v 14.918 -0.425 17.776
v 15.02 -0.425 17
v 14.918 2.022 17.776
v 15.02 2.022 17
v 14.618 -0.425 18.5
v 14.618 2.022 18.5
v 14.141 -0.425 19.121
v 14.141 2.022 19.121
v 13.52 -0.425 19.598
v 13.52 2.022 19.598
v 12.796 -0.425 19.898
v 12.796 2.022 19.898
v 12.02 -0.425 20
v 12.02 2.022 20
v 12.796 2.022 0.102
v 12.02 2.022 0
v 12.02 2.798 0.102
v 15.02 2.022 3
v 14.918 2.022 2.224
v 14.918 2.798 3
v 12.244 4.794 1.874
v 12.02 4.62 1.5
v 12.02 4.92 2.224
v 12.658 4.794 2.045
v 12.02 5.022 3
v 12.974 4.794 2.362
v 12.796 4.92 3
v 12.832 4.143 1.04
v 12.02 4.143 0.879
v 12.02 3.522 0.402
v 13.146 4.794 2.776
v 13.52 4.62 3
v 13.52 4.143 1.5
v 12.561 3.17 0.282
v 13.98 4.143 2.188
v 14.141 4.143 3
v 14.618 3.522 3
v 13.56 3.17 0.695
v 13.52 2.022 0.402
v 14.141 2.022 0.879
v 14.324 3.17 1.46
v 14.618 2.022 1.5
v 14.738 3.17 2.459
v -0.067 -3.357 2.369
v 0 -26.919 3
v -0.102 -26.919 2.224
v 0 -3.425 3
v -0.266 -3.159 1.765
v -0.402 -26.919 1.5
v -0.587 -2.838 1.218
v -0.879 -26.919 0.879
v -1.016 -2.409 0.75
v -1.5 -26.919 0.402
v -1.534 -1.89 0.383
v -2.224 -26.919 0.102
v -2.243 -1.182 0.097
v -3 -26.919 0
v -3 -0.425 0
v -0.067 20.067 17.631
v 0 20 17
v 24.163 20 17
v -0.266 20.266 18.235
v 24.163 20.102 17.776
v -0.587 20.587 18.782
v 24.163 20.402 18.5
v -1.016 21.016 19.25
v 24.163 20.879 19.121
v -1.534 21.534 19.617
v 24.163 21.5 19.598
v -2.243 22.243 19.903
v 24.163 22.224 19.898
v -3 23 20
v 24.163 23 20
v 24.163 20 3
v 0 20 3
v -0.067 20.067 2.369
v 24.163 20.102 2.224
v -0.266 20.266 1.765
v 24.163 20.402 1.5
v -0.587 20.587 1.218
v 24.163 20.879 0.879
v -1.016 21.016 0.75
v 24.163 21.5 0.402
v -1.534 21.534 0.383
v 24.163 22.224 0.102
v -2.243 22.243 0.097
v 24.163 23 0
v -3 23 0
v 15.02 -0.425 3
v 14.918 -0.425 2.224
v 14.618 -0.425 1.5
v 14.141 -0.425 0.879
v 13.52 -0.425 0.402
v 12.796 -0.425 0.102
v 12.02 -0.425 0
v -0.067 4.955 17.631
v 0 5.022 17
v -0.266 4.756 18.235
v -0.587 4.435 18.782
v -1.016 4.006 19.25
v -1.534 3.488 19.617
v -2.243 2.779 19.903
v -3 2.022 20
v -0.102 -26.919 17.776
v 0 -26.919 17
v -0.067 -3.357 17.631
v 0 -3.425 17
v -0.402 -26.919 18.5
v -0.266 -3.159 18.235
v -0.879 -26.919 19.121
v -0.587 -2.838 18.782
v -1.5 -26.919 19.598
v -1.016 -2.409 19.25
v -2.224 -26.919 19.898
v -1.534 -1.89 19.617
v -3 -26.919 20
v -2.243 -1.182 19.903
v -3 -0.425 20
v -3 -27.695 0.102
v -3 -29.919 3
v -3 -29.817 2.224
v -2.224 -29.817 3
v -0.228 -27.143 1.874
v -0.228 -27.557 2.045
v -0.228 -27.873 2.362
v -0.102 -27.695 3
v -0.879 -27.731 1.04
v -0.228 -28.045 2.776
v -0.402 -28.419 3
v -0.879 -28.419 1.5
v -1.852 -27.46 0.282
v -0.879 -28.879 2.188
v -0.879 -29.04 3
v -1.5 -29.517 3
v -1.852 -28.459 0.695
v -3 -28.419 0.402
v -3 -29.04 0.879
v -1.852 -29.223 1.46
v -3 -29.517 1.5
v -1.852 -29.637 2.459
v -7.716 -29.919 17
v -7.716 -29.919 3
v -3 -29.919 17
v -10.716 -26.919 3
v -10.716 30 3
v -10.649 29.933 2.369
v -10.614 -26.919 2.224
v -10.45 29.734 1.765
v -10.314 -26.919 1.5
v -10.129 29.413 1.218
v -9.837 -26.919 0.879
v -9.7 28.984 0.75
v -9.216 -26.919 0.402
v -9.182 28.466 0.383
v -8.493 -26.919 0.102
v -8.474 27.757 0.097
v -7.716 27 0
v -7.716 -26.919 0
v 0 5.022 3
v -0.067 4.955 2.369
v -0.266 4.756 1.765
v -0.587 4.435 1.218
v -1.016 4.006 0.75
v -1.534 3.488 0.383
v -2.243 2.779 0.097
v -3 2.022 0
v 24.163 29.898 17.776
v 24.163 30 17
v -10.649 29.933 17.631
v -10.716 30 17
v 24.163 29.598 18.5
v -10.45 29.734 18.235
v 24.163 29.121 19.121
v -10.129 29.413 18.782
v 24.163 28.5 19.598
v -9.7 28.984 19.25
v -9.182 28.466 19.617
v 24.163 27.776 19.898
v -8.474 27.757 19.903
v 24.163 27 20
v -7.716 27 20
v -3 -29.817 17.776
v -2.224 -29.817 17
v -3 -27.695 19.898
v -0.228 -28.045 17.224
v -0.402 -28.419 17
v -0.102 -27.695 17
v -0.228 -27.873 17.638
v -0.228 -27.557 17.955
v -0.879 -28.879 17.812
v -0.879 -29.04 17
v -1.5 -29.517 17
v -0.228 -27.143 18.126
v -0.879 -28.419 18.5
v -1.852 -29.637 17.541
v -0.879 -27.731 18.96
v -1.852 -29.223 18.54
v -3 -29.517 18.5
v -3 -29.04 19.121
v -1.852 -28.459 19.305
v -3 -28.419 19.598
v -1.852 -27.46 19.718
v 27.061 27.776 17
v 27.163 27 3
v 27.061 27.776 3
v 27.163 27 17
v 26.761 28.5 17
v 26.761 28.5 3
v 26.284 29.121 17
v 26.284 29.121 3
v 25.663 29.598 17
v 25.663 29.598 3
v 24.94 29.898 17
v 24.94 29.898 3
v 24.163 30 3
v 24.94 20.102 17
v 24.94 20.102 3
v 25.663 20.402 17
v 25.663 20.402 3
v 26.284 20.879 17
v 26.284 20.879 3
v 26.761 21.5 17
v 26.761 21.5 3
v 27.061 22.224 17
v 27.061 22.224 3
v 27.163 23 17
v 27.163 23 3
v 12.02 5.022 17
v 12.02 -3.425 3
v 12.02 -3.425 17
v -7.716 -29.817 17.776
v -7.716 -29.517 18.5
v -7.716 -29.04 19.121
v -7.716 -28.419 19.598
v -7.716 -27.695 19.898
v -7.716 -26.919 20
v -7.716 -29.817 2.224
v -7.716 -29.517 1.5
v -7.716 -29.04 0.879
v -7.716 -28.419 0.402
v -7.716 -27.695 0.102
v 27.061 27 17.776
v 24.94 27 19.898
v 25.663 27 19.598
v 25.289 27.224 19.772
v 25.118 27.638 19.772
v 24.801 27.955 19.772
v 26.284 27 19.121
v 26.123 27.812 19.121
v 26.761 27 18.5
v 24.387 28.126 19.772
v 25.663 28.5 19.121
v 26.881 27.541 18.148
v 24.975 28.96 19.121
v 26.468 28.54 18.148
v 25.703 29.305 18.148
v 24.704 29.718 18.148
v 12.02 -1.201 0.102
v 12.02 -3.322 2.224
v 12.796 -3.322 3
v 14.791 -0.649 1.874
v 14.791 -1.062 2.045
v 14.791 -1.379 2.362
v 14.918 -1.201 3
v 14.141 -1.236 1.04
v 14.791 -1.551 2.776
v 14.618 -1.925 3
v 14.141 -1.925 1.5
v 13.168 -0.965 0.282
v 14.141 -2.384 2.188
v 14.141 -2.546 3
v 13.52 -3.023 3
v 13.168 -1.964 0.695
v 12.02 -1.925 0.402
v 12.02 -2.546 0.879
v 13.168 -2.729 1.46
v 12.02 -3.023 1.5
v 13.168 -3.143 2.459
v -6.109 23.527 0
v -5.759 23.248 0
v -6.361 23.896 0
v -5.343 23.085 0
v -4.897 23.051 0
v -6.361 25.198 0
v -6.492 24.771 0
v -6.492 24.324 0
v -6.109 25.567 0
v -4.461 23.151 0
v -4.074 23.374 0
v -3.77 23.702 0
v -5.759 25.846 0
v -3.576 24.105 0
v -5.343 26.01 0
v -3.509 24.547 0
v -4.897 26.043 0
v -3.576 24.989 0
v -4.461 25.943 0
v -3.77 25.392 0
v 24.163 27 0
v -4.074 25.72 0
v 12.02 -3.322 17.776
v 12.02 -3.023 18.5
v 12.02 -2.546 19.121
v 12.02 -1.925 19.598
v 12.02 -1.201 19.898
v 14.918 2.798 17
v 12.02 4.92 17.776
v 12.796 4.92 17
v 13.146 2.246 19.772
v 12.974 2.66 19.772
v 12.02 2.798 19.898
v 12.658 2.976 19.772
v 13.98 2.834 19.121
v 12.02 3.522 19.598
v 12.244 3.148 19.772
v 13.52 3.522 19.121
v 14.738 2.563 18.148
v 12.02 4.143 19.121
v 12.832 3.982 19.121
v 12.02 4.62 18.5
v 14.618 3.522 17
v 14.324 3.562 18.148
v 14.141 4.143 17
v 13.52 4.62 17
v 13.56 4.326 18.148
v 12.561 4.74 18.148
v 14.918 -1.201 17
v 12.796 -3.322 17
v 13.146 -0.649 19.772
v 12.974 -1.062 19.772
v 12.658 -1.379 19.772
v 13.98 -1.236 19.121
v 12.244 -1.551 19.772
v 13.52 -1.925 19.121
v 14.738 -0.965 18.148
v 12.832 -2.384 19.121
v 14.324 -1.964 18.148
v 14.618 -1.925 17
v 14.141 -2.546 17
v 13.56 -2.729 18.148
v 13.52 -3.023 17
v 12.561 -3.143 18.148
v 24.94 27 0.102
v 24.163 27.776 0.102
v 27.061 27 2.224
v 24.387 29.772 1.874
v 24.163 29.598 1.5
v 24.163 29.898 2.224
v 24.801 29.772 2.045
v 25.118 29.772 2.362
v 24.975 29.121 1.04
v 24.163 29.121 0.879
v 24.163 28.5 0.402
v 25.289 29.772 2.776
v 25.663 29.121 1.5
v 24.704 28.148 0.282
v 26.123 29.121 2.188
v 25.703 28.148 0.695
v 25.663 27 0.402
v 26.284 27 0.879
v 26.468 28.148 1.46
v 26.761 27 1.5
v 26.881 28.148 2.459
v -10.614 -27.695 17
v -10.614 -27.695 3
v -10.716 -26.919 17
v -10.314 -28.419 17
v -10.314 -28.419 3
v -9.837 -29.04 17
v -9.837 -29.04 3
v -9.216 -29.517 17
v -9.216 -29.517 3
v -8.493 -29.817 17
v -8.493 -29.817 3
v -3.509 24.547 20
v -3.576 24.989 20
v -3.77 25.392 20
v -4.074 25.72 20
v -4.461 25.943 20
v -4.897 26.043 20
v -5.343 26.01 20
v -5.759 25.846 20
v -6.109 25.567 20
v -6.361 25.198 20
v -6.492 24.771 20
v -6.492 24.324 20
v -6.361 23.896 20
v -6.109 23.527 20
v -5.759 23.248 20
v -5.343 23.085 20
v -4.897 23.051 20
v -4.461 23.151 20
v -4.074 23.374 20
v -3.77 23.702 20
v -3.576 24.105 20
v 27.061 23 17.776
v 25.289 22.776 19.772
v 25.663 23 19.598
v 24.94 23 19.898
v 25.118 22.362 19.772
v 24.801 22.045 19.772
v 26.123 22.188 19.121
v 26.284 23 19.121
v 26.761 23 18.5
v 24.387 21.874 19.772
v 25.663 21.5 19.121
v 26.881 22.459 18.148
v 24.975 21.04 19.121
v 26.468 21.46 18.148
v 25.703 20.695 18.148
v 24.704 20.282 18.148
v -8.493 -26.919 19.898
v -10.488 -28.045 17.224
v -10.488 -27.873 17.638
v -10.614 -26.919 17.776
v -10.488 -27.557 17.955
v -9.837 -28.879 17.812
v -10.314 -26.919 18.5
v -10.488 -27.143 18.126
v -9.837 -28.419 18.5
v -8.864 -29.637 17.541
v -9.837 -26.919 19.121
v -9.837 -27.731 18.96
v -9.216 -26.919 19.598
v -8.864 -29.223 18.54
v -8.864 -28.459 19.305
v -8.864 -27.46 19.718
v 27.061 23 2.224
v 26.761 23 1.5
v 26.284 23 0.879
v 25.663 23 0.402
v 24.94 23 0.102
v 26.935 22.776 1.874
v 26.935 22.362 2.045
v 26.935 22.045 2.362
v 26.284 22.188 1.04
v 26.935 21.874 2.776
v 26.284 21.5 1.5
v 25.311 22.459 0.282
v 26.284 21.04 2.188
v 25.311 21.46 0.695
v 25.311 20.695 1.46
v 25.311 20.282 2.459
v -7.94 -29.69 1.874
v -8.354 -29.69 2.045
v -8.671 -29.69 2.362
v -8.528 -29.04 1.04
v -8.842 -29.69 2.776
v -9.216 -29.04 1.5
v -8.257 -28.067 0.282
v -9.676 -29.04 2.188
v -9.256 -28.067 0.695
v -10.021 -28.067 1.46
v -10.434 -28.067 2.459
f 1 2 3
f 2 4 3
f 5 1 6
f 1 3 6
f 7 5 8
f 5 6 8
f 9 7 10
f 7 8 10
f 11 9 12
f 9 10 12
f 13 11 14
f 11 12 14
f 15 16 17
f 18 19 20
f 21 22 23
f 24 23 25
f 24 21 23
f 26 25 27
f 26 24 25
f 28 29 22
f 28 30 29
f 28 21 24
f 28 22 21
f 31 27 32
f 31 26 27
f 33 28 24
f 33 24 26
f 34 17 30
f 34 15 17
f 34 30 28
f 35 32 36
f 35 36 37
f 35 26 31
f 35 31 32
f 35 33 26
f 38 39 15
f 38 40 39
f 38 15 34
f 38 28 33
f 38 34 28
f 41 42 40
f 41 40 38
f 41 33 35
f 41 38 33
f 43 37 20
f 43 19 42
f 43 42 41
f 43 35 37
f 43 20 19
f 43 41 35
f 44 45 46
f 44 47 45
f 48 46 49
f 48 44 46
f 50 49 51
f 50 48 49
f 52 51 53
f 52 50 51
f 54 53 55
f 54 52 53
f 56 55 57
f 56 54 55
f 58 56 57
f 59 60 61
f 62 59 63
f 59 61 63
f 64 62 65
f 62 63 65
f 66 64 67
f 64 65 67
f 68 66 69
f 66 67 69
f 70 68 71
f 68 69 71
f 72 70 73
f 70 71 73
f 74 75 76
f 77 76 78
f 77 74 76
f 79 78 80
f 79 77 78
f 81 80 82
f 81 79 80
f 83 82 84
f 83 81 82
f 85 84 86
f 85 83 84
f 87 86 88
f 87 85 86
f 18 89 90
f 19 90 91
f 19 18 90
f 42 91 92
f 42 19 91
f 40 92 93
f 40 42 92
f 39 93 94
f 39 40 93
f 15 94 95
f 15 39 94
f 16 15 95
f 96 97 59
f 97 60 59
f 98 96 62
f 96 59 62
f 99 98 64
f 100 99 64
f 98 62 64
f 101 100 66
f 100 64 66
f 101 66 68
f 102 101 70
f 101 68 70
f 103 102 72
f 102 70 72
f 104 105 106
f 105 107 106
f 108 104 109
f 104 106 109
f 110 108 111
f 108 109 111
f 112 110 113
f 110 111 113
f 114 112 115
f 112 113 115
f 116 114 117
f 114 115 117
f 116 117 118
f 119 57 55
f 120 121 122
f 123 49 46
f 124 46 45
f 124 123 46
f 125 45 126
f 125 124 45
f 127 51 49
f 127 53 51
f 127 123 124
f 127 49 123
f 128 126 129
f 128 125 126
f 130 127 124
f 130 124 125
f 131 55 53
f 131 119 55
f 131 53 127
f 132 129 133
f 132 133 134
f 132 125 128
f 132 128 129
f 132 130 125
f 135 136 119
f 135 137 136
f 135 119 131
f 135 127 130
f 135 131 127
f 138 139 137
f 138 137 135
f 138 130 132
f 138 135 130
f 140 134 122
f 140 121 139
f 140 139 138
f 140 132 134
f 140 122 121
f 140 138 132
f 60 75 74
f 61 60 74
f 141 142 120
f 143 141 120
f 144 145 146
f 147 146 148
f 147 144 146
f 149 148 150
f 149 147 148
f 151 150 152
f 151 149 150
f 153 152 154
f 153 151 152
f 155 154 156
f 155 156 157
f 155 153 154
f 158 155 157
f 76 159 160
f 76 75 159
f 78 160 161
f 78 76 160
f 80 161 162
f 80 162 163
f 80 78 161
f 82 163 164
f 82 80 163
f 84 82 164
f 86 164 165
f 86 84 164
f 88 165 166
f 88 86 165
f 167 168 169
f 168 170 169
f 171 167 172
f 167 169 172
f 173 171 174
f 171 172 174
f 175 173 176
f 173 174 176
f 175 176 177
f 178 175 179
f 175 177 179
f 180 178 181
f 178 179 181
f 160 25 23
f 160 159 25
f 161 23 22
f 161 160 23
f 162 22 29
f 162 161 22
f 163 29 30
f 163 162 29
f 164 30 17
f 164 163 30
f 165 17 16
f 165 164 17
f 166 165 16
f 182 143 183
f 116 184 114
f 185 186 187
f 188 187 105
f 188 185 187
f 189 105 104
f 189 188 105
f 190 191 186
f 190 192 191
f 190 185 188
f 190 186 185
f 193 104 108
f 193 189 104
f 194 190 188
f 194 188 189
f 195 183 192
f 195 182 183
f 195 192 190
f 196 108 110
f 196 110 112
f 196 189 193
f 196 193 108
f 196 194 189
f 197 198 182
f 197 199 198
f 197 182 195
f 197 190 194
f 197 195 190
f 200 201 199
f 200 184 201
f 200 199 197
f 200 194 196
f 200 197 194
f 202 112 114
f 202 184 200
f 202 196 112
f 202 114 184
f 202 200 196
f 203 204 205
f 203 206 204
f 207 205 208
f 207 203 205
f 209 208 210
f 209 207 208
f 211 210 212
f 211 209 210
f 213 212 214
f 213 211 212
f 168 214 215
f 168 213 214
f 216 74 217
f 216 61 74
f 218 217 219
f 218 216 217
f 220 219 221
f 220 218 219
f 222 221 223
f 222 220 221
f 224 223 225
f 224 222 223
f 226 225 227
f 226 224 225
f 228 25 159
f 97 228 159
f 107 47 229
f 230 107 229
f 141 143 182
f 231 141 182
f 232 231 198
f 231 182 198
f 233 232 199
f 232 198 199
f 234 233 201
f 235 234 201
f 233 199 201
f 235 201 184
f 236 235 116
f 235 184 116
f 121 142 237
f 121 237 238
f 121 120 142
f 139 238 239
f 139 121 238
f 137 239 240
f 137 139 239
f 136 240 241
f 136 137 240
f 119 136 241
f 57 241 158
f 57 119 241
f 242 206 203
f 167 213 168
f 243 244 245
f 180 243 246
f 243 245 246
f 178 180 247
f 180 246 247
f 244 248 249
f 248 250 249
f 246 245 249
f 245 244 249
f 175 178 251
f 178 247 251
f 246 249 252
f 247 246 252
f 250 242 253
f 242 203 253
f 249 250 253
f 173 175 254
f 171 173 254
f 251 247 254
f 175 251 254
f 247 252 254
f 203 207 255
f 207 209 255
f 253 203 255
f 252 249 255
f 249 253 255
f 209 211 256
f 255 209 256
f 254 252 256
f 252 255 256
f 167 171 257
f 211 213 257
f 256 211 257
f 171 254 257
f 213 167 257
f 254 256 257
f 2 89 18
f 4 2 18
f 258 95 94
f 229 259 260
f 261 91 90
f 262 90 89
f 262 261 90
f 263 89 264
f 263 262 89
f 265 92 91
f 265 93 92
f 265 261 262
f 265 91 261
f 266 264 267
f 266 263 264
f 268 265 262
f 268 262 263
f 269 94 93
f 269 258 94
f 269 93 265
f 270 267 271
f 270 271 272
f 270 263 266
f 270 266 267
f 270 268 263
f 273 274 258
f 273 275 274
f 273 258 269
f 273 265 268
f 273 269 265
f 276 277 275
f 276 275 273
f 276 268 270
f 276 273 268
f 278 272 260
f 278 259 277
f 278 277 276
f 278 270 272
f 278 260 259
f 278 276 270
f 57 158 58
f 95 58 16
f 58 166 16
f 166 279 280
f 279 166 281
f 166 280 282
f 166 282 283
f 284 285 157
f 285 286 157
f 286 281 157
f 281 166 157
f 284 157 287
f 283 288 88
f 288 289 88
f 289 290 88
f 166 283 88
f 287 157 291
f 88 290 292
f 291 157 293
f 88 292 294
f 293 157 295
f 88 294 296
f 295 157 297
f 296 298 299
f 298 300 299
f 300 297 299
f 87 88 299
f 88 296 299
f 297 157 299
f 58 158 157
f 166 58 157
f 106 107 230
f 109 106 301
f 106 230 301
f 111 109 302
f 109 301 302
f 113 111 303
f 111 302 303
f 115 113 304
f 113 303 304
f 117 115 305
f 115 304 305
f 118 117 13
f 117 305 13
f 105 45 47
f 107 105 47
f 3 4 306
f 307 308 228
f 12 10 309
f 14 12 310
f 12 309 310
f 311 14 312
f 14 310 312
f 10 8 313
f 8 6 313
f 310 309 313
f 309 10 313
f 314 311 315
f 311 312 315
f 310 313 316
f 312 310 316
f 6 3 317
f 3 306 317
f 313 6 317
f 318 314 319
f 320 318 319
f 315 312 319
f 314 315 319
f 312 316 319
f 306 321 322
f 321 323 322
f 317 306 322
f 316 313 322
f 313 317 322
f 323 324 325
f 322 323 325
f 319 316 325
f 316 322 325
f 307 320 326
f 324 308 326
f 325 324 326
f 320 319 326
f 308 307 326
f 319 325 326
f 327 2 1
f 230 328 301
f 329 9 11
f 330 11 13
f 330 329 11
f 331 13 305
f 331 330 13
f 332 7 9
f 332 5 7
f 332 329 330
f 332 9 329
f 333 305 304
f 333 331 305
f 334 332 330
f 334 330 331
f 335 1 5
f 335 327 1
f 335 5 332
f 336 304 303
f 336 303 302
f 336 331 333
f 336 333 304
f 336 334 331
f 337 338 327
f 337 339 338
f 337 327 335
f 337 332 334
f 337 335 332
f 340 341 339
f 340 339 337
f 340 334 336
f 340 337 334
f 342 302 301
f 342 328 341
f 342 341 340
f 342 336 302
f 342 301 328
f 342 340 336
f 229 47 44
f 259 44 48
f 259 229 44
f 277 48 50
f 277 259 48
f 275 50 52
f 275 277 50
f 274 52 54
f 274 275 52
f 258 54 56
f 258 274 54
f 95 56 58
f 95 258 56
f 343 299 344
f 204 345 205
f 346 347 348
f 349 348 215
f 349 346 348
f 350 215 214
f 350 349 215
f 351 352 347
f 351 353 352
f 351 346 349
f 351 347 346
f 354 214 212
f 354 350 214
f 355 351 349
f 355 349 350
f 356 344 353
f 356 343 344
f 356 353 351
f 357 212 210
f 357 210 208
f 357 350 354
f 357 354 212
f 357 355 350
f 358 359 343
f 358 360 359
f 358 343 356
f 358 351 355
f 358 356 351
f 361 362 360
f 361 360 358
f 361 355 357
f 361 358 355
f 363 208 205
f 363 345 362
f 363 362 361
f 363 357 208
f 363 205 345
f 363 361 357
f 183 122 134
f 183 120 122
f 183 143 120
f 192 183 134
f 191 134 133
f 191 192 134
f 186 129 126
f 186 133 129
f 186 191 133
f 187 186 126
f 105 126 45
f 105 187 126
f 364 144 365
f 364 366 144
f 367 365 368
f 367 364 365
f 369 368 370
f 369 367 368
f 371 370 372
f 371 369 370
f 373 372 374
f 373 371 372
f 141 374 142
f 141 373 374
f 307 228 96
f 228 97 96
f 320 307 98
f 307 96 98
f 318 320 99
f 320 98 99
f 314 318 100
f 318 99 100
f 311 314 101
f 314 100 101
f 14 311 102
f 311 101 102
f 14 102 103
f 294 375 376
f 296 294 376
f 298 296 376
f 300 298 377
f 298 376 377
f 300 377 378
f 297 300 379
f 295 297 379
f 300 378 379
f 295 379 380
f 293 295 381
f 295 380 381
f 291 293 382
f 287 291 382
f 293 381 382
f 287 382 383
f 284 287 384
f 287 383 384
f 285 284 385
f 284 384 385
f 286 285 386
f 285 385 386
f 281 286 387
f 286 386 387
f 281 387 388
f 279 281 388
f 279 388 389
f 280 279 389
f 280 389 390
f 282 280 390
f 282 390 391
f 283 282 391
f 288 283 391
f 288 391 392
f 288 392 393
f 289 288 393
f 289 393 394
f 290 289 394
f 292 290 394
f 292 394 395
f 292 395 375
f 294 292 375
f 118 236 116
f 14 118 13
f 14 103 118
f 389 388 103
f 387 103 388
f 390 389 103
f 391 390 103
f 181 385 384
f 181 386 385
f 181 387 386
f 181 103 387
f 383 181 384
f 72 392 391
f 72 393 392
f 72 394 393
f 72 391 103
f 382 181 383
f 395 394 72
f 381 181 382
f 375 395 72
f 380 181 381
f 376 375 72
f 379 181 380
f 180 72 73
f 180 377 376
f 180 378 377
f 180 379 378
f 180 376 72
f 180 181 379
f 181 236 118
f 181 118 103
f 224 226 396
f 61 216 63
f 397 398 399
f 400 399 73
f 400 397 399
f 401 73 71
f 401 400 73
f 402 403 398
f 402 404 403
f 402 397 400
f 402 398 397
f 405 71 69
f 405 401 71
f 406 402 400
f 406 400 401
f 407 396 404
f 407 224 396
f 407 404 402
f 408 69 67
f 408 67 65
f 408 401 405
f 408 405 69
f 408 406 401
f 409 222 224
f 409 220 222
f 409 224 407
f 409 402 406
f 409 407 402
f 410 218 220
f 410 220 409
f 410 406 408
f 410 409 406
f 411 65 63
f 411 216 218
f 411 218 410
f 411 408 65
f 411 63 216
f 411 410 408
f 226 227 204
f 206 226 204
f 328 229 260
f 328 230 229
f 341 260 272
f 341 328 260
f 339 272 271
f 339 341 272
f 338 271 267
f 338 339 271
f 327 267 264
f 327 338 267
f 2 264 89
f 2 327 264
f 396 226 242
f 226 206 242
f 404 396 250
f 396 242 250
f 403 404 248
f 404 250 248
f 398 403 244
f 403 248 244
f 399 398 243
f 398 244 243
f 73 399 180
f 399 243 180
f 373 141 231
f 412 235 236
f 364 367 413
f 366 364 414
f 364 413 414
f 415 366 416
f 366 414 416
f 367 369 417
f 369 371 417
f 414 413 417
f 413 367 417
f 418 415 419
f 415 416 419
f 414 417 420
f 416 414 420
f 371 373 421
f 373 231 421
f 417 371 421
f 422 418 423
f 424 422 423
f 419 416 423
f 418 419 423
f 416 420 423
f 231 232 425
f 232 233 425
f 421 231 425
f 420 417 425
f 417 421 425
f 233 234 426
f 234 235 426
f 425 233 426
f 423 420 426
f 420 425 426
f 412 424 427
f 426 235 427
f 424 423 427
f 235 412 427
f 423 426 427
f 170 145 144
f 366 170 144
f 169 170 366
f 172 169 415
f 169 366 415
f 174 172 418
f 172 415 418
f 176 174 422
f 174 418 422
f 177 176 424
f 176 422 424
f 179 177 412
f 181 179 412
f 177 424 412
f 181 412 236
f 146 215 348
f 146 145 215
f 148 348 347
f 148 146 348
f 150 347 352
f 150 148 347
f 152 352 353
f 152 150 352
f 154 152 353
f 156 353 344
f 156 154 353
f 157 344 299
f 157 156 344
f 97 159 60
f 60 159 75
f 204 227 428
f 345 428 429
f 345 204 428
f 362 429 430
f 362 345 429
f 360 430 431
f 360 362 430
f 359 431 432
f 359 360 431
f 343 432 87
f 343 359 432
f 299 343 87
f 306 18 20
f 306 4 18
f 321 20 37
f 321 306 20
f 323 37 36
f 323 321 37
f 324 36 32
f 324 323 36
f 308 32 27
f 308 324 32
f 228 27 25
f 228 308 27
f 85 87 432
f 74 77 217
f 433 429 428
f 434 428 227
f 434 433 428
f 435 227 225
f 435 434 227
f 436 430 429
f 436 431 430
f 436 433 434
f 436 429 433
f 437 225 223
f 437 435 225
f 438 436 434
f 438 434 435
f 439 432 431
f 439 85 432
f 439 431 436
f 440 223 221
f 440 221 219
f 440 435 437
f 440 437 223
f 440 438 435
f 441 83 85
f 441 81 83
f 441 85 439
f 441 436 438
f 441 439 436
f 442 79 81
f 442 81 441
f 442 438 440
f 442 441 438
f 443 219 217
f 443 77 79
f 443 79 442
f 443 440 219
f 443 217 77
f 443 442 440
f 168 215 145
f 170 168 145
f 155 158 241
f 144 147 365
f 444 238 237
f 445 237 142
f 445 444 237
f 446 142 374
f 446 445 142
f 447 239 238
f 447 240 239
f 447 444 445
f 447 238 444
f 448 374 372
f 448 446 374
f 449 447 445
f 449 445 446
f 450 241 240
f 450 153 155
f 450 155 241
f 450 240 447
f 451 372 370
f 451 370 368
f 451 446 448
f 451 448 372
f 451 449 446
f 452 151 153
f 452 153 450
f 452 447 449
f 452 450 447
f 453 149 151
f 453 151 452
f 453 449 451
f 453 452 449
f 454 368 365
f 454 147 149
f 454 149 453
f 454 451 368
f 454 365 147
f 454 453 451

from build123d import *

# Parameters (mm, degrees)
F1_DEPTH = 20
F2_R     = 3
F3_R     = 1.5
F4_DEPTH = 25


with BuildPart() as f1:
    # F0 (on Top) → F1 (new body)
    with BuildSketch(Plane.XY):
        Polygon((0, 5.021903), (0, 0), (0, -3.424607), (15.019838, -3.424607), (15.019838, 5.021903), align=None)
        Polygon((0, -3.424607), (0, 0), (0, 5.021903), (0, 13.150787), (0, 20), (14.283885, 20), (27.16307, 20), (27.16307, 30), (14.283885, 30), (-10.716115, 30), (-10.716115, 29), (-10.716115, -21), (-10.716115, -29.918844), (0, -29.918844), (0, -21), (0, -20), (0, -8.509332), align=None)
    extrude(amount=F1_DEPTH)

    # F2
    f2_edges = [f1.edges().sort_by_distance(p)[0] for p in [
        (13.581535, 20, 0),
        (27.16307, 25, 0),
        (8.223477, 30, 0),
        (-10.716115, 0.040578, 0),
        (-5.358057, -29.918844, 0),
        (0, -16.671725, 0),
        (7.509919, -3.424607, 0),
        (15.019838, 0.798648, 0),
        (7.509919, 5.021903, 0),
        (0, 12.510952, 0),
        (27.16307, 20, 10),
        (27.16307, 30, 10),
        (27.16307, 25, 20),
        (15.019838, -3.424607, 10),
        (15.019838, 5.021903, 10),
        (15.019838, 0.798648, 20),
        (-5.358057, -29.918844, 20),
        (-10.716115, -29.918844, 10),
        (0, -29.918844, 10),
        (13.581535, 20, 20),
        (0, 12.510952, 20),
        (8.223477, 30, 20),
        (-10.716115, 0.040578, 20),
        (0, -16.671725, 20),
        (7.509919, -3.424607, 20),
        (7.509919, 5.021903, 20),
    ]]
    fillet(f2_edges, radius=F2_R)

    # F3 (on face) → F4 (cut)
    with BuildSketch(Plane.XY.offset(20)):
        with Locations((-5.009224, 24.547122)):
            Circle(F3_R)
    extrude(amount=-F4_DEPTH, mode=Mode.SUBTRACT)


solid = f1.part
